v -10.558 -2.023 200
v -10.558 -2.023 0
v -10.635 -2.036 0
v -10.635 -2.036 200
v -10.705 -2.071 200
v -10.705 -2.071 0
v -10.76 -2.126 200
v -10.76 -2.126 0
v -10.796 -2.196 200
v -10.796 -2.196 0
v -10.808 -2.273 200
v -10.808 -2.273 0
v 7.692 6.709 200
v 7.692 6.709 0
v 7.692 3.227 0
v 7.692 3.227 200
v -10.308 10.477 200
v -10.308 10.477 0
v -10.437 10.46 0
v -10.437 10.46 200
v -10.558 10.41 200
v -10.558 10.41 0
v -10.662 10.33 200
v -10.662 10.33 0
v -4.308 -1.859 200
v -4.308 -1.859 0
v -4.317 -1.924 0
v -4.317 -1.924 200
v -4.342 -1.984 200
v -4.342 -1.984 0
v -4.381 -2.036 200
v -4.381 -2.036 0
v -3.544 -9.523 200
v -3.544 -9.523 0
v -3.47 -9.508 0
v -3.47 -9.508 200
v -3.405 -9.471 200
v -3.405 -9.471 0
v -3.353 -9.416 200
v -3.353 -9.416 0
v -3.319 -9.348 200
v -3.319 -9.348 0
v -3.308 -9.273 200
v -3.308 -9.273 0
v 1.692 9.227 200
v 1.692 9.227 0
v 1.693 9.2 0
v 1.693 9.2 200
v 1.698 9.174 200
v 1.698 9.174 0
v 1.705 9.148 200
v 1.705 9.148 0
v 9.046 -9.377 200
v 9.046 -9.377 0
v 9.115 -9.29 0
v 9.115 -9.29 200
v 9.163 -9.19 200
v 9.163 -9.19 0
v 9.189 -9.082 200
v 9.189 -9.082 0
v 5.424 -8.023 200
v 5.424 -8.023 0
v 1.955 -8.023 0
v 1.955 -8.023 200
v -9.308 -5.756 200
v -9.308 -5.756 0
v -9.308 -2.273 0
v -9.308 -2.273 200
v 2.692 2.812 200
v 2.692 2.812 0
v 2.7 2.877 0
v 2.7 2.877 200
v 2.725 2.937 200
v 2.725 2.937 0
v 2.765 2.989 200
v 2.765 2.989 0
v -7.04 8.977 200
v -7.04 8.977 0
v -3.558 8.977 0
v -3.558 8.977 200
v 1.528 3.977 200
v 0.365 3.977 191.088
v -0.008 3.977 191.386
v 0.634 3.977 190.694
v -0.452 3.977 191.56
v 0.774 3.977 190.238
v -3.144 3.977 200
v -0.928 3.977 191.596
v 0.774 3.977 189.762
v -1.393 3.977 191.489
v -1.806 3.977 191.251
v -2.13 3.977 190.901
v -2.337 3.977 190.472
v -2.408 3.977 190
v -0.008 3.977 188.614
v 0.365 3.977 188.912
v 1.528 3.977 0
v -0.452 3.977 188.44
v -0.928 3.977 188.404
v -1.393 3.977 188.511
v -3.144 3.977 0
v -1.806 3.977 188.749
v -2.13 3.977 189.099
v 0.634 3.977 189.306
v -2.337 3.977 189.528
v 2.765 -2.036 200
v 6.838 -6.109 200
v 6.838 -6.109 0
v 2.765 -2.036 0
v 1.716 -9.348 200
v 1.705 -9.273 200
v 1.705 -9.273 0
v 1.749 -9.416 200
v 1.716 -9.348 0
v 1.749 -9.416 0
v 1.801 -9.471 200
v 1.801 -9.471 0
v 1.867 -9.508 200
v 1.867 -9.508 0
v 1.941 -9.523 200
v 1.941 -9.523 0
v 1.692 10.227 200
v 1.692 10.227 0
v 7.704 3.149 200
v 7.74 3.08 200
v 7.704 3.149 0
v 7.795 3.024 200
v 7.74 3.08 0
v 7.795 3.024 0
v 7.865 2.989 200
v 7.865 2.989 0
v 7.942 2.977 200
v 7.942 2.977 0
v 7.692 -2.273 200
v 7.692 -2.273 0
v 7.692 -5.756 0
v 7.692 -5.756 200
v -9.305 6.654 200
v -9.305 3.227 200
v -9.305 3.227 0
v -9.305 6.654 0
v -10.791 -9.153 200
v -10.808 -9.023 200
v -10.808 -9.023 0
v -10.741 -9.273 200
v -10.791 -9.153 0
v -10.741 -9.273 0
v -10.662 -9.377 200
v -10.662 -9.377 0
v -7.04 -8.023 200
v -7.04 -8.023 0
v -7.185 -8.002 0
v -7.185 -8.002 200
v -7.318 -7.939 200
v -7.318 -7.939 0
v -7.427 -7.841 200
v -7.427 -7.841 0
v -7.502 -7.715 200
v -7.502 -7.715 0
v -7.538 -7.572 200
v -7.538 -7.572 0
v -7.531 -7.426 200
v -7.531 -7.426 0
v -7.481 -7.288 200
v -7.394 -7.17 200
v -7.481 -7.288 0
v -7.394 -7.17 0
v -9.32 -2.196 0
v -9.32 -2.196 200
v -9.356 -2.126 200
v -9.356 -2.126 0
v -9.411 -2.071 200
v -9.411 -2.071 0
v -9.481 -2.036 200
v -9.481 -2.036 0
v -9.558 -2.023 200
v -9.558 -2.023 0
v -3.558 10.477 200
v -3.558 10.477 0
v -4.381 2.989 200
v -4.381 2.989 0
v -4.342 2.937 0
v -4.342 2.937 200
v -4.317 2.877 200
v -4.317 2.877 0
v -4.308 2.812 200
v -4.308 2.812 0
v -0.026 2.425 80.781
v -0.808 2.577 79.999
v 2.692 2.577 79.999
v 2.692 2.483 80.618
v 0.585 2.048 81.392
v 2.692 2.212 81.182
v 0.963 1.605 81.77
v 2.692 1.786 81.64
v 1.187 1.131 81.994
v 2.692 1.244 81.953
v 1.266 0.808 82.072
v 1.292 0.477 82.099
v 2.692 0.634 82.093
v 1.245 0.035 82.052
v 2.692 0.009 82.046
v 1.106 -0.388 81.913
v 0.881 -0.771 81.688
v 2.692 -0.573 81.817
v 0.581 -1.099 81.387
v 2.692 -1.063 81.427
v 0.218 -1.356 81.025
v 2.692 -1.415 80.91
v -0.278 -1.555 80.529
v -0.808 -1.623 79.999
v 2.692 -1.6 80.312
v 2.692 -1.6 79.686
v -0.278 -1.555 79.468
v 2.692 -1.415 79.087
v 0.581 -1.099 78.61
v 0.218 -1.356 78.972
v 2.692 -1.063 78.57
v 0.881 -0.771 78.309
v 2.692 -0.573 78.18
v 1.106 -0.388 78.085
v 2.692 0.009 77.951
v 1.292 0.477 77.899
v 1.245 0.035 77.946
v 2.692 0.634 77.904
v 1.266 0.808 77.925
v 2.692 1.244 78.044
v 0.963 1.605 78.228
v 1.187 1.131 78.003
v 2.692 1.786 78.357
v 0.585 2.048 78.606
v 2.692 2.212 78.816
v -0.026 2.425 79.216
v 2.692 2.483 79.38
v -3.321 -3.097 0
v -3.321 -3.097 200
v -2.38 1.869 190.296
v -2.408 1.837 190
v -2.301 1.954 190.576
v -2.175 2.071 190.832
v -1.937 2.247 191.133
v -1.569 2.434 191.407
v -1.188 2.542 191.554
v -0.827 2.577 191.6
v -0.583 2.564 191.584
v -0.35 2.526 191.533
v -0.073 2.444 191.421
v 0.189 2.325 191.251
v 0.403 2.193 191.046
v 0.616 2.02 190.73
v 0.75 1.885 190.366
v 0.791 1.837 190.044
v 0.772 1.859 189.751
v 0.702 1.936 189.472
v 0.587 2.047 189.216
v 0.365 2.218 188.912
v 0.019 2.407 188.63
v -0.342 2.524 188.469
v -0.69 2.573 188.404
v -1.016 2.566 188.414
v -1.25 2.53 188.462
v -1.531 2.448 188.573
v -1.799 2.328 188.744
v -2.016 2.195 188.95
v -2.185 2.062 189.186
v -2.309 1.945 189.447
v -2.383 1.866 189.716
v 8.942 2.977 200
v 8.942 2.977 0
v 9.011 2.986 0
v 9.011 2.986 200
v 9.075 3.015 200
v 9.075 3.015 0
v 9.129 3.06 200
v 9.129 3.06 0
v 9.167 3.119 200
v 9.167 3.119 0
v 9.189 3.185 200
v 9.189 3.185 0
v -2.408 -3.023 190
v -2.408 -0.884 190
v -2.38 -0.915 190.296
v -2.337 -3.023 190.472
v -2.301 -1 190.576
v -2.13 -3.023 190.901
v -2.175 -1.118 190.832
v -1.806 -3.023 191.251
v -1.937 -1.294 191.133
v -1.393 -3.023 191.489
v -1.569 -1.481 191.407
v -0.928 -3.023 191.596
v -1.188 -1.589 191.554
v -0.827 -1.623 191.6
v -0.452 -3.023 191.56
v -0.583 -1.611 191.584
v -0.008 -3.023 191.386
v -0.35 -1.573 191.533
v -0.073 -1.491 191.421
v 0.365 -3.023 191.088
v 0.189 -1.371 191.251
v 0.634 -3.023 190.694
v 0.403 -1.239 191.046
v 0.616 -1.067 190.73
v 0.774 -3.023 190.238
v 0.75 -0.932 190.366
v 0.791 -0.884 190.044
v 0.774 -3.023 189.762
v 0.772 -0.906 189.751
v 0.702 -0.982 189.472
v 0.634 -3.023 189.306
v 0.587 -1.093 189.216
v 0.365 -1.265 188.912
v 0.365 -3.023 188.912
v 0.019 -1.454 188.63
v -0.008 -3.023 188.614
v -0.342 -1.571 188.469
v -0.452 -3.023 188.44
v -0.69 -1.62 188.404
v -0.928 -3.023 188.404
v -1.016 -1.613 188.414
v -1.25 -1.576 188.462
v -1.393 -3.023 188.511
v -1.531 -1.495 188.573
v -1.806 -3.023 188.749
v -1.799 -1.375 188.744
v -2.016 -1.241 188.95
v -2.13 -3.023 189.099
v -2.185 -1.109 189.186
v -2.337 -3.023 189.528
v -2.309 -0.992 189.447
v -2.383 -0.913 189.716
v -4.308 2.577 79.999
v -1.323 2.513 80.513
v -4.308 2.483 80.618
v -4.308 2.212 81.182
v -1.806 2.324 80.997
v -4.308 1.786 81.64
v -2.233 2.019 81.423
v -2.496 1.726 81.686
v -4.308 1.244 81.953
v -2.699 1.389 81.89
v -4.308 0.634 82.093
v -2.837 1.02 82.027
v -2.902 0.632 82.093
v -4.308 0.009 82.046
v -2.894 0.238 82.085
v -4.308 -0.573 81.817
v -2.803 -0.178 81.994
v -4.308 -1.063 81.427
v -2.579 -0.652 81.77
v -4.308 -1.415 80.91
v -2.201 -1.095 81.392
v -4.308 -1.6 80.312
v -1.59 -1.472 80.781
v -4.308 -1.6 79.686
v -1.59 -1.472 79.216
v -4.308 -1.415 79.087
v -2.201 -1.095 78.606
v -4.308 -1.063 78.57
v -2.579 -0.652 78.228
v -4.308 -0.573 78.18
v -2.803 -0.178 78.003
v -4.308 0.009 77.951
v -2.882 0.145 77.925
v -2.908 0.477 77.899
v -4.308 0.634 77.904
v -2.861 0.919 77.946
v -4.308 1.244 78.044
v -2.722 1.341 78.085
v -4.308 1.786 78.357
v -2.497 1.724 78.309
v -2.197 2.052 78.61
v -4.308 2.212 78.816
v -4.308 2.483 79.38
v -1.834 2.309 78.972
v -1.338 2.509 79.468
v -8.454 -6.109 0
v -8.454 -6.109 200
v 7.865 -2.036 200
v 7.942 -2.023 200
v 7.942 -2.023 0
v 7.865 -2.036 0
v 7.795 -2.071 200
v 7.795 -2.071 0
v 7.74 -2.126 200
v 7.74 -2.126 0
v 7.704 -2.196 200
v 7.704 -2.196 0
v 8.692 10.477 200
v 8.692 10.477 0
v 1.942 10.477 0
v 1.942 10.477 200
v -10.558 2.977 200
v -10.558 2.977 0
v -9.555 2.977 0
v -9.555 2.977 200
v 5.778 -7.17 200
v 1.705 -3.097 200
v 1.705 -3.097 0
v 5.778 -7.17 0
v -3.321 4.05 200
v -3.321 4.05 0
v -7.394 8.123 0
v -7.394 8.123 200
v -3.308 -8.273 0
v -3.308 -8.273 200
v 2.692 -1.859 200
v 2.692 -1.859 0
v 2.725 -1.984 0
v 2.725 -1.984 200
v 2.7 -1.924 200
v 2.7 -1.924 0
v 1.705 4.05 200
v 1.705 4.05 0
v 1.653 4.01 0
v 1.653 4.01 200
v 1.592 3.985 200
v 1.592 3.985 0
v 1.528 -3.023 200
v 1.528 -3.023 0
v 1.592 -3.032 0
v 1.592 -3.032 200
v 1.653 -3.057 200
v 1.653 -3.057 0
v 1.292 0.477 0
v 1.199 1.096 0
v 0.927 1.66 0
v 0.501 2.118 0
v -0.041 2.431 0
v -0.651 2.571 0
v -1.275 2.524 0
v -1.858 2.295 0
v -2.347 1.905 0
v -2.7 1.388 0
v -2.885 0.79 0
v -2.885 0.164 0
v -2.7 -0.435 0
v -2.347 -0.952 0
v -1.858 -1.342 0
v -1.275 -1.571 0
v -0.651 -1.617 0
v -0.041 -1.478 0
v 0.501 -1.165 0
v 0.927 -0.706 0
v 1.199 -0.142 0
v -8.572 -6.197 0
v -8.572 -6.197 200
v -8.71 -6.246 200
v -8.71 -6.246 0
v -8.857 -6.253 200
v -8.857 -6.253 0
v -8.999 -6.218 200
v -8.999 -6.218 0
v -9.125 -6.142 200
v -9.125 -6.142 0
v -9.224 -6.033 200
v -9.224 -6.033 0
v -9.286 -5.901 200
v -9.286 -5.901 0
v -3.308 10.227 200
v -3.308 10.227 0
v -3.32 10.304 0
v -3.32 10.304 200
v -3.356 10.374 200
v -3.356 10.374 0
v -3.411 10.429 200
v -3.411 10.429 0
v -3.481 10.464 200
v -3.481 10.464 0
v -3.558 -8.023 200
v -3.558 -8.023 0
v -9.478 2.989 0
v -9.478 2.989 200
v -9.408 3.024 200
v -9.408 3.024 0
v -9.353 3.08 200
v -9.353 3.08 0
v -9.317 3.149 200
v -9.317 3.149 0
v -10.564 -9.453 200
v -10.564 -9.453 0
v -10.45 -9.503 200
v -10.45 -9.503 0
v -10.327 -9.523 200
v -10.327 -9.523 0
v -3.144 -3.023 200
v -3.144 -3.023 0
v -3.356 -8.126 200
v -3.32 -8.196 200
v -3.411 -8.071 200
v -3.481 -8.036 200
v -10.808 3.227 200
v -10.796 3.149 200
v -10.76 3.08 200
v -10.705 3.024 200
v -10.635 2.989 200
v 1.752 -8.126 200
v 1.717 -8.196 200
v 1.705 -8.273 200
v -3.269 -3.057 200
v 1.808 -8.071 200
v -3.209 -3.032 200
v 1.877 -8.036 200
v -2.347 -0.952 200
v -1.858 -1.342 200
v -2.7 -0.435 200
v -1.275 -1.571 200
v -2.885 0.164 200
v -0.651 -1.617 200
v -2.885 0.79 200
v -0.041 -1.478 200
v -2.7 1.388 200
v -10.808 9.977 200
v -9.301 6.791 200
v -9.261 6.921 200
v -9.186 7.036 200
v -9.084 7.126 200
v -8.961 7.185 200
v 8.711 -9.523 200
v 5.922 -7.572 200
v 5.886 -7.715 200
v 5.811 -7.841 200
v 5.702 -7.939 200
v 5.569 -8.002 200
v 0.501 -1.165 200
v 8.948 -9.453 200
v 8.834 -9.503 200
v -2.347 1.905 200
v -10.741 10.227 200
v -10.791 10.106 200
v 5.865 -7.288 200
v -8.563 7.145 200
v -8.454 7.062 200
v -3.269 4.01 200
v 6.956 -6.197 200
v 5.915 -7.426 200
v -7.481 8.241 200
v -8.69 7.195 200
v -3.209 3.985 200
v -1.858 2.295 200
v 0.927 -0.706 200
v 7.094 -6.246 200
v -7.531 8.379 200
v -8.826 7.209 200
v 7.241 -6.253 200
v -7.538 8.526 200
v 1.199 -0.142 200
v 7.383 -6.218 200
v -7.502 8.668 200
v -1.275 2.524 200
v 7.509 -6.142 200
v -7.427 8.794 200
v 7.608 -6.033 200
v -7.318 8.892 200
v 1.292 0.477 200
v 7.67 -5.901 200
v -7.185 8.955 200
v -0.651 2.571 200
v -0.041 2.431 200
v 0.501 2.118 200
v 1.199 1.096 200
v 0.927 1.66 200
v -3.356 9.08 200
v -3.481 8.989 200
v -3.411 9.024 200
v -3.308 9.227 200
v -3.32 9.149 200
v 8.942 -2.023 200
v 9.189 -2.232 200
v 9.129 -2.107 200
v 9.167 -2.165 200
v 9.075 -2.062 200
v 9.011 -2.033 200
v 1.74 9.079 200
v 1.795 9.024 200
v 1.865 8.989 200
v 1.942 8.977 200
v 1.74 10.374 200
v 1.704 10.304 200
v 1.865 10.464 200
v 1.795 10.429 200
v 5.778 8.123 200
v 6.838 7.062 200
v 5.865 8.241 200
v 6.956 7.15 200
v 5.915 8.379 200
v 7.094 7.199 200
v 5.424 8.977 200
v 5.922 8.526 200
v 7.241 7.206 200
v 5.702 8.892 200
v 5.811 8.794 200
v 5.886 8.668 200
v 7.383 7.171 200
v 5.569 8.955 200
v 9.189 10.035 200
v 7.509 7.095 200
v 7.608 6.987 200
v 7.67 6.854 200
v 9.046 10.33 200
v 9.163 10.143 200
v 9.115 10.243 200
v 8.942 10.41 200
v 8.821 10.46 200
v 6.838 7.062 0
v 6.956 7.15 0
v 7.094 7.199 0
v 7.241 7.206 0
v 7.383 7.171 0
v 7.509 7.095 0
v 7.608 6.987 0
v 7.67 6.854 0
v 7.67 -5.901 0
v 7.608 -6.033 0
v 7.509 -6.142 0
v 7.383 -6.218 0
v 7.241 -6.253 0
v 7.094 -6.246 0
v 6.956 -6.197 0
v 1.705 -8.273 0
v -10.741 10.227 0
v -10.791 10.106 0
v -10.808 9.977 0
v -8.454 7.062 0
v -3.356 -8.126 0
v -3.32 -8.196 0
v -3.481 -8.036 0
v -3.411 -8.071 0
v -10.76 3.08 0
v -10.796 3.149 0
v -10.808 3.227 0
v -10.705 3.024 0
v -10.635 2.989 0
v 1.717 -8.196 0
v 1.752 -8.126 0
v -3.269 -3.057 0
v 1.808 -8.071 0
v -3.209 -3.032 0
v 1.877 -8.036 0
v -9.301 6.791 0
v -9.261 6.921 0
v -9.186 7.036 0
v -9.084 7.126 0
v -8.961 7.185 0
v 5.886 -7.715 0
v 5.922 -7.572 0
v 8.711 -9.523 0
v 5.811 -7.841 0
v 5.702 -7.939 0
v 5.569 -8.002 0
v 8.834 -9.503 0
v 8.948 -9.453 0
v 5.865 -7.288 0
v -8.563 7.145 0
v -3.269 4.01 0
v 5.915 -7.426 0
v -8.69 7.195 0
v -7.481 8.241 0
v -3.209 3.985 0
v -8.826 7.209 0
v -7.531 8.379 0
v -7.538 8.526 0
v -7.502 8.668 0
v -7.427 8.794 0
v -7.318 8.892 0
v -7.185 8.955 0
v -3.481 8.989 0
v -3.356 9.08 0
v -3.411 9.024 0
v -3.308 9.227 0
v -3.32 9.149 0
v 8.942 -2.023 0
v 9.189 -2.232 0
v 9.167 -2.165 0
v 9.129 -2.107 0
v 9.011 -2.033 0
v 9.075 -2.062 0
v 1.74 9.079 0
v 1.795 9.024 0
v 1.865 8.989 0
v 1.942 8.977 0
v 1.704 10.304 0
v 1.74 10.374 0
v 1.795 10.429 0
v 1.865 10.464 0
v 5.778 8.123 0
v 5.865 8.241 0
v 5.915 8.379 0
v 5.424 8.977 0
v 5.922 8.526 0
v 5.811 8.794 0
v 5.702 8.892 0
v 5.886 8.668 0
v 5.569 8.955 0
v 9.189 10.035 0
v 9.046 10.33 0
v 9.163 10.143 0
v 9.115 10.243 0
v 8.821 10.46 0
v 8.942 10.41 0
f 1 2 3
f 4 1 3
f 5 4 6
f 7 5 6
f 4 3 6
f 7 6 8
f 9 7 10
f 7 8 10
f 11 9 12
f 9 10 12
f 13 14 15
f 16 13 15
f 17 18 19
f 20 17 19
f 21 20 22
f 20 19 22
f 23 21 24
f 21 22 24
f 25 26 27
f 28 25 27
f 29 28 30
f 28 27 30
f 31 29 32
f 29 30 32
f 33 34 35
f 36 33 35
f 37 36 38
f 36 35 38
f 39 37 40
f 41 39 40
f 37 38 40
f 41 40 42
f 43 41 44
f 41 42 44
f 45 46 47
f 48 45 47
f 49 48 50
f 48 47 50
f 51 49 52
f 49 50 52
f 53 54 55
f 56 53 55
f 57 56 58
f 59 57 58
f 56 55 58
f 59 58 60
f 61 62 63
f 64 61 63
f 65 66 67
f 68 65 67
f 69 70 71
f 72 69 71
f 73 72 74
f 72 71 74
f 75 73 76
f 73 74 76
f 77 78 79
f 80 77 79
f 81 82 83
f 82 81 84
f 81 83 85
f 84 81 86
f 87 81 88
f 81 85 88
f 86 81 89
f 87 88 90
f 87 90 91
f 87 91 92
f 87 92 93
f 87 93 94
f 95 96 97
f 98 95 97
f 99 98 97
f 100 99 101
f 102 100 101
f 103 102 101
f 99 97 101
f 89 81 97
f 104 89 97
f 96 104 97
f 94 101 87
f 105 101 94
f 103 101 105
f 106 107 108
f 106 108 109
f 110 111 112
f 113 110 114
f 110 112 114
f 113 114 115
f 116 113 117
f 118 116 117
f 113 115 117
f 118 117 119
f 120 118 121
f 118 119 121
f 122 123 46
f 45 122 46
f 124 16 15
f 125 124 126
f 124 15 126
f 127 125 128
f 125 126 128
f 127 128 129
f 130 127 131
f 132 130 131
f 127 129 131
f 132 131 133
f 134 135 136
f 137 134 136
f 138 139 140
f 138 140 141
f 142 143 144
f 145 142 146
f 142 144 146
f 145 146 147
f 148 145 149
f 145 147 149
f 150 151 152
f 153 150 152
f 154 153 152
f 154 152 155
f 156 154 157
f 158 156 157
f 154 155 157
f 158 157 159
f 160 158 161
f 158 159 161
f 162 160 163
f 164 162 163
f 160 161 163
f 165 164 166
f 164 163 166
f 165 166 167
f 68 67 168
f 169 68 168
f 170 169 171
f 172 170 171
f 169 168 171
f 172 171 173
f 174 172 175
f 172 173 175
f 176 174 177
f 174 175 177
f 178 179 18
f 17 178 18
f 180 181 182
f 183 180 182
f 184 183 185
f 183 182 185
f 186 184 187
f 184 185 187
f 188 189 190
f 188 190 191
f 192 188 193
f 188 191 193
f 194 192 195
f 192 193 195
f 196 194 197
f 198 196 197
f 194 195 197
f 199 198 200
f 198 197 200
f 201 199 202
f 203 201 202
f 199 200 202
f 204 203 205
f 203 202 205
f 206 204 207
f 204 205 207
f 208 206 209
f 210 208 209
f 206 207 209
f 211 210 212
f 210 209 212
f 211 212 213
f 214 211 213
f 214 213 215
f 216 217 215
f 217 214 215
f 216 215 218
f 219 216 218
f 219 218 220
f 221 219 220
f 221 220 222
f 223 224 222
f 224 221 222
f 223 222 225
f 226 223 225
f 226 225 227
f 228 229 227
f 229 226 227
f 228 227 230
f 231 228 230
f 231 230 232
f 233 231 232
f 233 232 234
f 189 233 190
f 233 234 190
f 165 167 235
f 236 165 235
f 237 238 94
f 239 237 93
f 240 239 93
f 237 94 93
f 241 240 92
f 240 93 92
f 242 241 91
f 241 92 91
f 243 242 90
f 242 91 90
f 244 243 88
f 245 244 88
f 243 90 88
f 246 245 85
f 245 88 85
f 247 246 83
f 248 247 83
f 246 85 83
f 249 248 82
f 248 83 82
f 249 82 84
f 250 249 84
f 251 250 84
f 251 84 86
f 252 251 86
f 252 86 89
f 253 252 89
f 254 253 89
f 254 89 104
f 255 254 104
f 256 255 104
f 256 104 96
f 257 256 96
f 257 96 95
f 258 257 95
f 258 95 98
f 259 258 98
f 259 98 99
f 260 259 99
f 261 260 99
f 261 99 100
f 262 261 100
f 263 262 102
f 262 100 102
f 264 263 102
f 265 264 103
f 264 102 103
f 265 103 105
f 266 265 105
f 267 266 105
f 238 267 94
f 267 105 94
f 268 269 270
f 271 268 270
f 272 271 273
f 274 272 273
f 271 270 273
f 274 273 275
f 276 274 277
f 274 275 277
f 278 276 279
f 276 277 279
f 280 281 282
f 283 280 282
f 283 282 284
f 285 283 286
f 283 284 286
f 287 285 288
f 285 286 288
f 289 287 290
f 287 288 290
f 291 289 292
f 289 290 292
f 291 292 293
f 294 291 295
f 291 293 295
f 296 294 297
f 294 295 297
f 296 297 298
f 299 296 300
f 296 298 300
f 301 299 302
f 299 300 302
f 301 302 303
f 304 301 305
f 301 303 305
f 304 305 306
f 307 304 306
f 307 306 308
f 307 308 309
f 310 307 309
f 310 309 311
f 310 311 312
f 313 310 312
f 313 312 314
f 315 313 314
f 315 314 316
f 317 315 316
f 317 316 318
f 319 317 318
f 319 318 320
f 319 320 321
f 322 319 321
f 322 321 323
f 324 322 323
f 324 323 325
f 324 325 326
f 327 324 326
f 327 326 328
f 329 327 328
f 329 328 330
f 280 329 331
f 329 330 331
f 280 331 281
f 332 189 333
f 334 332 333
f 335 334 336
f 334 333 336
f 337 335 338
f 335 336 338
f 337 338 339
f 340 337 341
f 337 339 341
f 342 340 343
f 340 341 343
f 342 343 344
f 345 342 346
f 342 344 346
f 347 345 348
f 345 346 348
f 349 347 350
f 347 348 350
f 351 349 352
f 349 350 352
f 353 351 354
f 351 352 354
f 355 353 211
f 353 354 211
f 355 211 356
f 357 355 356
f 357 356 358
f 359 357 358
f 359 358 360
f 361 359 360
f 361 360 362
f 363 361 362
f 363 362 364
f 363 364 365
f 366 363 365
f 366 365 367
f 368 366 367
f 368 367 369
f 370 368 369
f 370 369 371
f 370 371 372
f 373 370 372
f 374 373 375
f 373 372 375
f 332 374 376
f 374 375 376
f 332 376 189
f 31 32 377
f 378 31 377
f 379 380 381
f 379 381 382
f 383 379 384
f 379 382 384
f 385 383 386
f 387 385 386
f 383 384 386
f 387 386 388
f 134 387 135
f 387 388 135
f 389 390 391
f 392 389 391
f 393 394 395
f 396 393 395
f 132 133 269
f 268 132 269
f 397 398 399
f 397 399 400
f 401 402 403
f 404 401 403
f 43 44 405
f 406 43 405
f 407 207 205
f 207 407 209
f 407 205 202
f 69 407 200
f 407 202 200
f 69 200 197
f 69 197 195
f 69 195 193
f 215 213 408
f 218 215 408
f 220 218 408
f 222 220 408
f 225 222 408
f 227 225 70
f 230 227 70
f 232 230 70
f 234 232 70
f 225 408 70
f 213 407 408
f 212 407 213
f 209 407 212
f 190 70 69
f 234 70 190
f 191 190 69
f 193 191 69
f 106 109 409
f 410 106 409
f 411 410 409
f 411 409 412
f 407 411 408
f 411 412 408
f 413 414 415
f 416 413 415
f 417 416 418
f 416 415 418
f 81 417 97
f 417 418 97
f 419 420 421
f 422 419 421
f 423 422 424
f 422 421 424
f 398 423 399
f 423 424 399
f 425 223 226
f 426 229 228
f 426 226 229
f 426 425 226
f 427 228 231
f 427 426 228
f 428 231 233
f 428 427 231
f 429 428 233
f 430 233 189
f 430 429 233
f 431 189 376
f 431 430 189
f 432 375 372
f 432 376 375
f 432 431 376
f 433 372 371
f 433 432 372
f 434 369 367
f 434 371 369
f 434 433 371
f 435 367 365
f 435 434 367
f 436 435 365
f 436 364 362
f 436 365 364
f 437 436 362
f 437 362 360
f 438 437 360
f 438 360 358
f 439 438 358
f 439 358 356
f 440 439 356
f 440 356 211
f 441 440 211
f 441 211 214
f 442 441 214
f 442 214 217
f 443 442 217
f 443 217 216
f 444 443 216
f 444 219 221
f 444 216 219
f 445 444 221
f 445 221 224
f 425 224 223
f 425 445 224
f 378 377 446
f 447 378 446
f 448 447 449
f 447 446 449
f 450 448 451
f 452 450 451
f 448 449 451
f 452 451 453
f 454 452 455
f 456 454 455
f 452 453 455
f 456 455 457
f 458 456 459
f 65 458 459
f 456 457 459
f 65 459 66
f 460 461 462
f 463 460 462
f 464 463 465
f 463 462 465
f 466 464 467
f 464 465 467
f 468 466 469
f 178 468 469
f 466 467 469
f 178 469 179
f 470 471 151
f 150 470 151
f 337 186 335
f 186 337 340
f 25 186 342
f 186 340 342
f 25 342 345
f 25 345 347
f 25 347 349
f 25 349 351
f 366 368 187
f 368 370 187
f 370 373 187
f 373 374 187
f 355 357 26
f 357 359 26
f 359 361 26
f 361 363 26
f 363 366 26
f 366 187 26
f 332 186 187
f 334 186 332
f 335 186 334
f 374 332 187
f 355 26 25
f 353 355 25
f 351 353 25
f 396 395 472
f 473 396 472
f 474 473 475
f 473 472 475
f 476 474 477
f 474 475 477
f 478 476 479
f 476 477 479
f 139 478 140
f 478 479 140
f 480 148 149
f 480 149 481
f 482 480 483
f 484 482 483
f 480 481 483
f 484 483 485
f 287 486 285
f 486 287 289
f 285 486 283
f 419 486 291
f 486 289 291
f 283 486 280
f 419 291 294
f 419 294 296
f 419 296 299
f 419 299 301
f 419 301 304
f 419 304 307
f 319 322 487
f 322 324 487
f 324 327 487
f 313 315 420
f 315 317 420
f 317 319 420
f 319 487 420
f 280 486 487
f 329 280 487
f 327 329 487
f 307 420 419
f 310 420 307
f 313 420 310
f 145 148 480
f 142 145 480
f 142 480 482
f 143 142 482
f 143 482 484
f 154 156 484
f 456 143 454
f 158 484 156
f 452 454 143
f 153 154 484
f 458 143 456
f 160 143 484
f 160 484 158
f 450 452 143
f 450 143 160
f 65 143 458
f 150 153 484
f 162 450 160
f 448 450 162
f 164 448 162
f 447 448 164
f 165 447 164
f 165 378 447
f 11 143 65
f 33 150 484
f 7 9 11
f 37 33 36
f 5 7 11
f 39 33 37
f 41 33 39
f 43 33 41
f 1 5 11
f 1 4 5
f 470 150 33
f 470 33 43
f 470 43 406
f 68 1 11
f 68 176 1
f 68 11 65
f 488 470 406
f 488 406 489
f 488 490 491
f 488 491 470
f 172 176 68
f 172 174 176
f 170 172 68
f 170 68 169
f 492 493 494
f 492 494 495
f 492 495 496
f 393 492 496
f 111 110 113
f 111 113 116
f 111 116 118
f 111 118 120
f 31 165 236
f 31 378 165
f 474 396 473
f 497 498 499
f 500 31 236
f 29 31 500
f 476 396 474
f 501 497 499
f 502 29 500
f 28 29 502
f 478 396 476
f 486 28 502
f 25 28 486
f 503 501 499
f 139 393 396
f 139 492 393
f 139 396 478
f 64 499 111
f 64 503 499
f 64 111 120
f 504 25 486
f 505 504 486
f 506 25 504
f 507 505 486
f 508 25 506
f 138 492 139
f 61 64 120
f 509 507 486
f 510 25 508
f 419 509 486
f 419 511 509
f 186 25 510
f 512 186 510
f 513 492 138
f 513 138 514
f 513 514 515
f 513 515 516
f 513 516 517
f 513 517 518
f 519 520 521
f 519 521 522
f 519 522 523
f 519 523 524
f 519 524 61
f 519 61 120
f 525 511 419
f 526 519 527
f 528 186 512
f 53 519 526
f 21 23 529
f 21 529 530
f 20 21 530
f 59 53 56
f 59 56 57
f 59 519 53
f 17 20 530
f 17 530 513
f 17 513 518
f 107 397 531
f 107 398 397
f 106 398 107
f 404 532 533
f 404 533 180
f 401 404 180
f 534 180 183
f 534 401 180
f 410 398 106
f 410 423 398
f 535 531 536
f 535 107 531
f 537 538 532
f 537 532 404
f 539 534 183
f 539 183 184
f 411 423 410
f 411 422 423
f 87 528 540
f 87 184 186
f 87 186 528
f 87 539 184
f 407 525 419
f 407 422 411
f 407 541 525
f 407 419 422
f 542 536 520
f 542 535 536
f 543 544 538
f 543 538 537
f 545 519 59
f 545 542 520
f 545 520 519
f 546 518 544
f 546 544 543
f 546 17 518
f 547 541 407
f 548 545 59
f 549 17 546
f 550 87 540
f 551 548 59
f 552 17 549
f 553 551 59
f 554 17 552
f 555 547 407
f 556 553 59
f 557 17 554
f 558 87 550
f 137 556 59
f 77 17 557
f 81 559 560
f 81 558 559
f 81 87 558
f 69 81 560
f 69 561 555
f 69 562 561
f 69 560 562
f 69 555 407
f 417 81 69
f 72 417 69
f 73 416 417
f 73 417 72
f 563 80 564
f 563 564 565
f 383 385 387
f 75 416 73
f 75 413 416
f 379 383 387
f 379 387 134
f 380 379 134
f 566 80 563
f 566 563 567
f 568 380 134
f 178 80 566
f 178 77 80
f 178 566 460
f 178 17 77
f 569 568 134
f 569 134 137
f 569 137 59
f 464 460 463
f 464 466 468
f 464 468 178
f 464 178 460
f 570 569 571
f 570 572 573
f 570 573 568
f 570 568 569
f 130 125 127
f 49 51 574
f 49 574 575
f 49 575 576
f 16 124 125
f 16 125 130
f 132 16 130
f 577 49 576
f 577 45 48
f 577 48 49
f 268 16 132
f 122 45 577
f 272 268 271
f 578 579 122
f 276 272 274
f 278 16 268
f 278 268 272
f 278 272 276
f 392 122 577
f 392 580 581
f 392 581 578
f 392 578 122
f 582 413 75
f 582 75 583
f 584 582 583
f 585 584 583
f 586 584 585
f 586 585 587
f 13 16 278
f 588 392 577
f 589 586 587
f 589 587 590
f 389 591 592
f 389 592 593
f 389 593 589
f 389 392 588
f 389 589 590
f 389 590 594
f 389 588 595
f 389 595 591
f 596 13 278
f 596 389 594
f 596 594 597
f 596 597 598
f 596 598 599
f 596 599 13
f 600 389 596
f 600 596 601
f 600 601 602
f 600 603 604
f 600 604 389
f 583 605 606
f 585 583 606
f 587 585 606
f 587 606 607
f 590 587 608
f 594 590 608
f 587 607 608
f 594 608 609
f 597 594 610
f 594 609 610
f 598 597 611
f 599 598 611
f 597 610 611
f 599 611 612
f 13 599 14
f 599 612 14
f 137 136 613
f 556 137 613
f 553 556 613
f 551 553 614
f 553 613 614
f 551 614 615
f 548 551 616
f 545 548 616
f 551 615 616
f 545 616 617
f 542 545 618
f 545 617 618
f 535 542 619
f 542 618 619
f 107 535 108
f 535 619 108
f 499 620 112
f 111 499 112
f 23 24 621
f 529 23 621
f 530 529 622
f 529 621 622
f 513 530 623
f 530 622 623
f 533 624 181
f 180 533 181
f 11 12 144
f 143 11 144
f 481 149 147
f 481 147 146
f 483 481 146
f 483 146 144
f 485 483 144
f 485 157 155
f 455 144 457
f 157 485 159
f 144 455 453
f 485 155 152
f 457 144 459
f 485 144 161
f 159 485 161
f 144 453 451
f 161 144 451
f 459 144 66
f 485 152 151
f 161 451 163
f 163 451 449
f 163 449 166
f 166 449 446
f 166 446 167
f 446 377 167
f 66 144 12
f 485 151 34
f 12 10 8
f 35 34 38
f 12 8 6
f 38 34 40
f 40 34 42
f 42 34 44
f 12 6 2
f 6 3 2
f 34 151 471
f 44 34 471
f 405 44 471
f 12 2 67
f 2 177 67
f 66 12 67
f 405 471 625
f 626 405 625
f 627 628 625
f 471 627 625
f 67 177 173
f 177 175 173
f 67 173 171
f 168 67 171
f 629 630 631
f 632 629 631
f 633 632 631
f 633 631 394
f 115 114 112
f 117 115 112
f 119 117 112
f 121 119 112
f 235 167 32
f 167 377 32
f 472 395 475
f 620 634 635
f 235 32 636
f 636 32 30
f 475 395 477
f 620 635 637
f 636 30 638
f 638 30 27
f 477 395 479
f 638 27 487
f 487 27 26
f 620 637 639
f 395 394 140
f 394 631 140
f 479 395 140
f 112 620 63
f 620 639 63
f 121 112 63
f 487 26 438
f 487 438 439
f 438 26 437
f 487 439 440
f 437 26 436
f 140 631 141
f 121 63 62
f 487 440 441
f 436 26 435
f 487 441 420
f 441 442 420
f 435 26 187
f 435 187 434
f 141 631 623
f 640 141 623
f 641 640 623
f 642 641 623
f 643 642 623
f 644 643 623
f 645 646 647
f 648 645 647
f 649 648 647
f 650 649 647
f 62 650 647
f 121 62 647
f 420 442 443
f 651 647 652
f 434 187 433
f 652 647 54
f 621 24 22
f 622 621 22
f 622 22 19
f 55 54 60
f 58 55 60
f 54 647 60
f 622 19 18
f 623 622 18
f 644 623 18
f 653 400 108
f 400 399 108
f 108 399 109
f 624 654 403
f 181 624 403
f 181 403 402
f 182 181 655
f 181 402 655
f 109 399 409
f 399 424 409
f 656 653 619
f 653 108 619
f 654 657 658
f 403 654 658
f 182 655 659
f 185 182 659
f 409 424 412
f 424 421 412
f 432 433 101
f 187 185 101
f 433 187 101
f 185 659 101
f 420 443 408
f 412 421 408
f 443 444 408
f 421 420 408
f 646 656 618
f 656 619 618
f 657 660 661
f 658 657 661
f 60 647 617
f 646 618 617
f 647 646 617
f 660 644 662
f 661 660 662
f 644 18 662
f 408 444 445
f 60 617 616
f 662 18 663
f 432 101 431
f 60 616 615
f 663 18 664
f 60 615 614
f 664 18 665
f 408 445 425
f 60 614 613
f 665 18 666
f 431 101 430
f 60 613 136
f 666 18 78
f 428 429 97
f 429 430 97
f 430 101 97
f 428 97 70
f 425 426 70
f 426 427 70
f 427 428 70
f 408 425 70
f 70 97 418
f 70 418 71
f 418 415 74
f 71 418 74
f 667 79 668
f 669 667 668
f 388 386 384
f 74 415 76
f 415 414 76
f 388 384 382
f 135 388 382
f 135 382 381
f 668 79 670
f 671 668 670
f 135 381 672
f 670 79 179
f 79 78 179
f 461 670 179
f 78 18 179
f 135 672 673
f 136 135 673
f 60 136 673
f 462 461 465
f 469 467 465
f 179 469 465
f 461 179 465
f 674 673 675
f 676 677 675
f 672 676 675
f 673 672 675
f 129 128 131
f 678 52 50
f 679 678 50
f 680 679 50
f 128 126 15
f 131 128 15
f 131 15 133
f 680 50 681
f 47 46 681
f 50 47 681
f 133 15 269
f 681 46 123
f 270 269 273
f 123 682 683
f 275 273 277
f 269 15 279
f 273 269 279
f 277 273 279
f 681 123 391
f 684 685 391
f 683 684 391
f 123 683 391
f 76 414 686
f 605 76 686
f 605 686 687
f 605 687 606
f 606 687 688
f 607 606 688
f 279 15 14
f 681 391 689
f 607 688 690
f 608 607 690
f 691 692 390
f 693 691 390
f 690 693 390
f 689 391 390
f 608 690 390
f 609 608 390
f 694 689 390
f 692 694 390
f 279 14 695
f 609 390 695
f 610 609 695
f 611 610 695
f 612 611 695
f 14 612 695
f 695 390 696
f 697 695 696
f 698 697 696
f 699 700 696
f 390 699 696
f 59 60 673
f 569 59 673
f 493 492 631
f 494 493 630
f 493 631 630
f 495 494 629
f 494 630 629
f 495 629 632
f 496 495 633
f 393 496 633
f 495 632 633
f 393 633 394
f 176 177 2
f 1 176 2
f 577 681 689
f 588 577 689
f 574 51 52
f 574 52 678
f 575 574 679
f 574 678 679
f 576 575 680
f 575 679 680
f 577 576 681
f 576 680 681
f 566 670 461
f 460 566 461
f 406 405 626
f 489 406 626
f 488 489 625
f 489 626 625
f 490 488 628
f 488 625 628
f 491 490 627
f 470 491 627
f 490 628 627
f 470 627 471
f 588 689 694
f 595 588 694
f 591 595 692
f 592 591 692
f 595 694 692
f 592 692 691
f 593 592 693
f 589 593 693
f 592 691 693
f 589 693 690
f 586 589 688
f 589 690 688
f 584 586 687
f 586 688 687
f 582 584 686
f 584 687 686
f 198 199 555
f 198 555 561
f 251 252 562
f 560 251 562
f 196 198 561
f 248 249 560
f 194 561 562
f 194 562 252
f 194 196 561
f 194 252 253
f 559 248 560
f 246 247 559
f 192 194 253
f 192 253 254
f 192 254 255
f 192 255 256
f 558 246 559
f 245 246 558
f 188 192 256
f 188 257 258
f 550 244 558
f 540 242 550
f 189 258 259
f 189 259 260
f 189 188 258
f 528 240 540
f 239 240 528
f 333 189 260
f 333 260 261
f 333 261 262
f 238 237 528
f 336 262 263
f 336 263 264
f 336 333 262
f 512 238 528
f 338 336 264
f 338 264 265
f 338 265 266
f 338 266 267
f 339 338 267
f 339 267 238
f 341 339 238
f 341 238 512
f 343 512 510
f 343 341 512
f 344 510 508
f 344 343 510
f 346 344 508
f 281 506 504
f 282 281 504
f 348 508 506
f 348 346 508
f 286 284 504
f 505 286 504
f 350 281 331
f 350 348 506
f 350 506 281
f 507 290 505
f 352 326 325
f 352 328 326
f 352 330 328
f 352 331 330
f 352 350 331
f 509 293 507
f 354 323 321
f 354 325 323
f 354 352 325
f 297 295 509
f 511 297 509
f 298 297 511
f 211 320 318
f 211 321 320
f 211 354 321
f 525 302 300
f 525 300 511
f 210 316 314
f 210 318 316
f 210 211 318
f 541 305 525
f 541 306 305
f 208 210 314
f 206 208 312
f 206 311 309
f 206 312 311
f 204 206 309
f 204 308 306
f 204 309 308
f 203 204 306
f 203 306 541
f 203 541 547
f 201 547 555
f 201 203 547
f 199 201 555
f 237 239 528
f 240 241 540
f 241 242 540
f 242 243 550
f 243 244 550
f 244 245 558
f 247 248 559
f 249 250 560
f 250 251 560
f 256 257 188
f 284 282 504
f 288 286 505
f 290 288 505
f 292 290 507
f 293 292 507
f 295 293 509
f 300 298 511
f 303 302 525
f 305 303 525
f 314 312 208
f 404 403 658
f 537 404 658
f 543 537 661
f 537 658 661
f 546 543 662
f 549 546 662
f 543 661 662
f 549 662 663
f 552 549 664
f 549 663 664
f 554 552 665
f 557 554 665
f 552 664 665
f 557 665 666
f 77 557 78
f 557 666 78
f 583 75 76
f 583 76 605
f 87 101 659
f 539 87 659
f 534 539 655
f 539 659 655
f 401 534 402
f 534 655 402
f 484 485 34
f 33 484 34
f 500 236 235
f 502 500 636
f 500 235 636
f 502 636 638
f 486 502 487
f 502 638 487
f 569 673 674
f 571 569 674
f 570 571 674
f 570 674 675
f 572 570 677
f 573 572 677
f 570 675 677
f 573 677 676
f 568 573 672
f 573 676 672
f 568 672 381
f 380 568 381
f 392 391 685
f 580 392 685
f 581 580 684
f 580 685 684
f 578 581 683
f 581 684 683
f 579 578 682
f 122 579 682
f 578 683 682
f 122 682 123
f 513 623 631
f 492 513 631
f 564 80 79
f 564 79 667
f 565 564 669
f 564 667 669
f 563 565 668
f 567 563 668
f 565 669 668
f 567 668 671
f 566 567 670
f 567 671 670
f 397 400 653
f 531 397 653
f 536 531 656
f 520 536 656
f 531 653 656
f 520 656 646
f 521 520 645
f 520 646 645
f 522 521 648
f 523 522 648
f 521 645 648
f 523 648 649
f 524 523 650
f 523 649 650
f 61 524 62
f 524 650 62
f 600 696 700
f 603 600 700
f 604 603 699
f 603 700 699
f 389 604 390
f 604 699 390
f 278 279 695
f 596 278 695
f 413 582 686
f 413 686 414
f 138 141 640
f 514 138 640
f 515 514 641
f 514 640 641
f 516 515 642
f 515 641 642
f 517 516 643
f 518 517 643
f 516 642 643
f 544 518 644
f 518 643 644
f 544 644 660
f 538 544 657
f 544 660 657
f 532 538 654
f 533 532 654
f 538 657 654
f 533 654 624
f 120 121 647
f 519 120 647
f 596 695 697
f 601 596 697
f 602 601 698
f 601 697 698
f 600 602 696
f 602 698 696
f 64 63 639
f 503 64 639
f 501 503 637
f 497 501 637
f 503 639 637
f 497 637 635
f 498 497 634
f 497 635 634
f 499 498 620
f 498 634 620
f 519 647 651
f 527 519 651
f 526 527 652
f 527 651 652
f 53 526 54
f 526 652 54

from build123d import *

# Parameters (mm, degrees)
F0_R     = 2.1
F1_DEPTH = 200
F2_R     = 2.1
F3_DEPTH = 7
F4_R     = 1.6
F5_DEPTH = 7


with BuildPart() as f1:
    # F0 (on Top) → F1 (new body)
    with BuildSketch(Plane.XY):
        with BuildLine():
            ThreePointArc((-3.308023, 10.226634), (-3.381246, 10.403411), (-3.558023, 10.476634))
            Line((-3.558023, 10.476634), (-10.308023, 10.476634))
            ThreePointArc((-10.308023, 10.476634), (-10.499365, 10.438574), (-10.661577, 10.330188))
            ThreePointArc((-10.661577, 10.330188), (-10.769963, 10.167976), (-10.808023, 9.976634))
            Line((-10.808023, 9.976634), (-10.808023, 3.226634))
            ThreePointArc((-10.808023, 3.226634), (-10.7348, 3.049858), (-10.558023, 2.976634))
            Line((-10.558023, 2.976634), (-9.555049, 2.976634))
            ThreePointArc((-9.555049, 2.976634), (-9.378272, 3.049858), (-9.305049, 3.226634))
            Line((-9.305049, 3.226634), (-9.305049, 6.654412))
            ThreePointArc((-9.305049, 6.654412), (-9.024273, 7.159685), (-8.45447, 7.062421))
            Line((-8.45447, 7.062421), (-4.381246, 2.989198))
            ThreePointArc((-4.381246, 2.989198), (-4.327053, 2.908092), (-4.308023, 2.812421))
            Line((-4.308023, 2.812421), (-4.308023, -1.859152))
            ThreePointArc((-4.308023, -1.859152), (-4.327053, -1.954823), (-4.381246, -2.035929))
            Line((-4.381246, -2.035929), (-8.45447, -6.109152))
            ThreePointArc((-8.45447, -6.109152), (-8.999365, -6.217538), (-9.308023, -5.755599))
            Line((-9.308023, -5.755599), (-9.308023, -2.273366))
            ThreePointArc((-9.308023, -2.273366), (-9.381246, -2.096589), (-9.558023, -2.023366))
            Line((-9.558023, -2.023366), (-10.558023, -2.023366))
            ThreePointArc((-10.558023, -2.023366), (-10.7348, -2.096589), (-10.808023, -2.273366))
            Line((-10.808023, -2.273366), (-10.808023, -9.023366))
            ThreePointArc((-10.808023, -9.023366), (-10.769963, -9.214707), (-10.661577, -9.376919))
            ThreePointArc((-10.661577, -9.376919), (-10.508248, -9.481525), (-10.327327, -9.522993))
            Line((-10.327327, -9.522993), (-3.544376, -9.522993))
            ThreePointArc((-3.544376, -9.522993), (-3.376486, -9.44525), (-3.308023, -9.273366))
            Line((-3.308023, -9.273366), (-3.308023, -8.273366))
            ThreePointArc((-3.308023, -8.273366), (-3.381246, -8.096589), (-3.558023, -8.023366))
            Line((-3.558023, -8.023366), (-7.040256, -8.023366))
            ThreePointArc((-7.040256, -8.023366), (-7.502196, -7.714707), (-7.39381, -7.169812))
            Line((-7.39381, -7.169812), (-3.320586, -3.096589))
            ThreePointArc((-3.320586, -3.096589), (-3.23948, -3.042396), (-3.14381, -3.023366))
            Line((-3.14381, -3.023366), (1.527763, -3.023366))
            ThreePointArc((1.527763, -3.023366), (1.623434, -3.042396), (1.70454, -3.096589))
            Line((1.70454, -3.096589), (5.777763, -7.169812))
            ThreePointArc((5.777763, -7.169812), (5.88615, -7.714707), (5.42421, -8.023366))
            Line((5.42421, -8.023366), (1.95454, -8.023366))
            ThreePointArc((1.95454, -8.023366), (1.777763, -8.096589), (1.70454, -8.273366))
            Line((1.70454, -8.273366), (1.70454, -9.273366))
            ThreePointArc((1.70454, -9.273366), (1.773002, -9.44525), (1.940893, -9.522993))
            Line((1.940893, -9.522993), (8.711281, -9.522993))
            ThreePointArc((8.711281, -9.522993), (8.892202, -9.481525), (9.04553, -9.376919))
            ThreePointArc((9.04553, -9.376919), (9.141878, -9.241515), (9.188525, -9.082012))
            Line((9.188525, -9.082012), (9.188525, -2.231968))
            ThreePointArc((9.188525, -2.231968), (9.103455, -2.082513), (8.941977, -2.023366))
            Line((8.941977, -2.023366), (7.941977, -2.023366))
            ThreePointArc((7.941977, -2.023366), (7.7652, -2.096589), (7.691977, -2.273366))
            Line((7.691977, -2.273366), (7.691977, -5.755599))
            ThreePointArc((7.691977, -5.755599), (7.383319, -6.217538), (6.838423, -6.109152))
            Line((6.838423, -6.109152), (2.7652, -2.035929))
            ThreePointArc((2.7652, -2.035929), (2.711007, -1.954823), (2.691977, -1.859152))
            Line((2.691977, -1.859152), (2.691977, 2.812421))
            ThreePointArc((2.691977, 2.812421), (2.711007, 2.908092), (2.7652, 2.989198))
            Line((2.7652, 2.989198), (6.838423, 7.062421))
            ThreePointArc((6.838423, 7.062421), (7.383319, 7.170807), (7.691977, 6.708867))
            Line((7.691977, 6.708867), (7.691977, 3.226634))
            ThreePointArc((7.691977, 3.226634), (7.7652, 3.049858), (7.941977, 2.976634))
            Line((7.941977, 2.976634), (8.941977, 2.976634))
            ThreePointArc((8.941977, 2.976634), (9.103455, 3.035782), (9.188525, 3.185237))
            Line((9.188525, 3.185237), (9.188525, 10.035281))
            ThreePointArc((9.188525, 10.035281), (9.141878, 10.194784), (9.04553, 10.330188))
            ThreePointArc((9.04553, 10.330188), (8.883319, 10.438574), (8.691977, 10.476634))
            Line((8.691977, 10.476634), (1.941977, 10.476634))
            ThreePointArc((1.941977, 10.476634), (1.7652, 10.403411), (1.691977, 10.226634))
            Line((1.691977, 10.226634), (1.691977, 9.226634))
            ThreePointArc((1.691977, 9.226634), (1.695138, 9.187006), (1.70454, 9.14838))
            ThreePointArc((1.70454, 9.14838), (1.795456, 9.024071), (1.941977, 8.976634))
            Line((1.941977, 8.976634), (5.42421, 8.976634))
            ThreePointArc((5.42421, 8.976634), (5.88615, 8.667976), (5.777763, 8.123081))
            Line((5.777763, 8.123081), (1.70454, 4.049858))
            ThreePointArc((1.70454, 4.049858), (1.623434, 3.995664), (1.527763, 3.976634))
            Line((1.527763, 3.976634), (-3.14381, 3.976634))
            ThreePointArc((-3.14381, 3.976634), (-3.23948, 3.995664), (-3.320586, 4.049858))
            Line((-3.320586, 4.049858), (-7.39381, 8.123081))
            ThreePointArc((-7.39381, 8.123081), (-7.502196, 8.667976), (-7.040256, 8.976634))
            Line((-7.040256, 8.976634), (-3.558023, 8.976634))
            ThreePointArc((-3.558023, 8.976634), (-3.381246, 9.049858), (-3.308023, 9.226634))
            Line((-3.308023, 9.226634), (-3.308023, 9.726634))
            Line((-3.308023, 9.726634), (-3.308023, 10.226634))
        make_face()
        with Locations((-0.808023, 0.476634)):
            Circle(F0_R, mode=Mode.SUBTRACT)
    extrude(amount=F1_DEPTH)

    # F2 (on face) → F3 (cut)
    with BuildSketch(Plane.YZ.offset(2.691977)):
        with Locations((0.476634, 79.99858)):
            Circle(F2_R)
    extrude(amount=-F3_DEPTH, mode=Mode.SUBTRACT)

    # F4 (on face) → F5 (cut)
    with BuildSketch(Plane(origin=(0, 3.976634, 0), x_dir=(-1, 0, 0), z_dir=(0, 1, 0))):
        with Locations((0.808023, 190)):
            Circle(F4_R)
    extrude(amount=-F5_DEPTH, mode=Mode.SUBTRACT)


solid = f1.part
